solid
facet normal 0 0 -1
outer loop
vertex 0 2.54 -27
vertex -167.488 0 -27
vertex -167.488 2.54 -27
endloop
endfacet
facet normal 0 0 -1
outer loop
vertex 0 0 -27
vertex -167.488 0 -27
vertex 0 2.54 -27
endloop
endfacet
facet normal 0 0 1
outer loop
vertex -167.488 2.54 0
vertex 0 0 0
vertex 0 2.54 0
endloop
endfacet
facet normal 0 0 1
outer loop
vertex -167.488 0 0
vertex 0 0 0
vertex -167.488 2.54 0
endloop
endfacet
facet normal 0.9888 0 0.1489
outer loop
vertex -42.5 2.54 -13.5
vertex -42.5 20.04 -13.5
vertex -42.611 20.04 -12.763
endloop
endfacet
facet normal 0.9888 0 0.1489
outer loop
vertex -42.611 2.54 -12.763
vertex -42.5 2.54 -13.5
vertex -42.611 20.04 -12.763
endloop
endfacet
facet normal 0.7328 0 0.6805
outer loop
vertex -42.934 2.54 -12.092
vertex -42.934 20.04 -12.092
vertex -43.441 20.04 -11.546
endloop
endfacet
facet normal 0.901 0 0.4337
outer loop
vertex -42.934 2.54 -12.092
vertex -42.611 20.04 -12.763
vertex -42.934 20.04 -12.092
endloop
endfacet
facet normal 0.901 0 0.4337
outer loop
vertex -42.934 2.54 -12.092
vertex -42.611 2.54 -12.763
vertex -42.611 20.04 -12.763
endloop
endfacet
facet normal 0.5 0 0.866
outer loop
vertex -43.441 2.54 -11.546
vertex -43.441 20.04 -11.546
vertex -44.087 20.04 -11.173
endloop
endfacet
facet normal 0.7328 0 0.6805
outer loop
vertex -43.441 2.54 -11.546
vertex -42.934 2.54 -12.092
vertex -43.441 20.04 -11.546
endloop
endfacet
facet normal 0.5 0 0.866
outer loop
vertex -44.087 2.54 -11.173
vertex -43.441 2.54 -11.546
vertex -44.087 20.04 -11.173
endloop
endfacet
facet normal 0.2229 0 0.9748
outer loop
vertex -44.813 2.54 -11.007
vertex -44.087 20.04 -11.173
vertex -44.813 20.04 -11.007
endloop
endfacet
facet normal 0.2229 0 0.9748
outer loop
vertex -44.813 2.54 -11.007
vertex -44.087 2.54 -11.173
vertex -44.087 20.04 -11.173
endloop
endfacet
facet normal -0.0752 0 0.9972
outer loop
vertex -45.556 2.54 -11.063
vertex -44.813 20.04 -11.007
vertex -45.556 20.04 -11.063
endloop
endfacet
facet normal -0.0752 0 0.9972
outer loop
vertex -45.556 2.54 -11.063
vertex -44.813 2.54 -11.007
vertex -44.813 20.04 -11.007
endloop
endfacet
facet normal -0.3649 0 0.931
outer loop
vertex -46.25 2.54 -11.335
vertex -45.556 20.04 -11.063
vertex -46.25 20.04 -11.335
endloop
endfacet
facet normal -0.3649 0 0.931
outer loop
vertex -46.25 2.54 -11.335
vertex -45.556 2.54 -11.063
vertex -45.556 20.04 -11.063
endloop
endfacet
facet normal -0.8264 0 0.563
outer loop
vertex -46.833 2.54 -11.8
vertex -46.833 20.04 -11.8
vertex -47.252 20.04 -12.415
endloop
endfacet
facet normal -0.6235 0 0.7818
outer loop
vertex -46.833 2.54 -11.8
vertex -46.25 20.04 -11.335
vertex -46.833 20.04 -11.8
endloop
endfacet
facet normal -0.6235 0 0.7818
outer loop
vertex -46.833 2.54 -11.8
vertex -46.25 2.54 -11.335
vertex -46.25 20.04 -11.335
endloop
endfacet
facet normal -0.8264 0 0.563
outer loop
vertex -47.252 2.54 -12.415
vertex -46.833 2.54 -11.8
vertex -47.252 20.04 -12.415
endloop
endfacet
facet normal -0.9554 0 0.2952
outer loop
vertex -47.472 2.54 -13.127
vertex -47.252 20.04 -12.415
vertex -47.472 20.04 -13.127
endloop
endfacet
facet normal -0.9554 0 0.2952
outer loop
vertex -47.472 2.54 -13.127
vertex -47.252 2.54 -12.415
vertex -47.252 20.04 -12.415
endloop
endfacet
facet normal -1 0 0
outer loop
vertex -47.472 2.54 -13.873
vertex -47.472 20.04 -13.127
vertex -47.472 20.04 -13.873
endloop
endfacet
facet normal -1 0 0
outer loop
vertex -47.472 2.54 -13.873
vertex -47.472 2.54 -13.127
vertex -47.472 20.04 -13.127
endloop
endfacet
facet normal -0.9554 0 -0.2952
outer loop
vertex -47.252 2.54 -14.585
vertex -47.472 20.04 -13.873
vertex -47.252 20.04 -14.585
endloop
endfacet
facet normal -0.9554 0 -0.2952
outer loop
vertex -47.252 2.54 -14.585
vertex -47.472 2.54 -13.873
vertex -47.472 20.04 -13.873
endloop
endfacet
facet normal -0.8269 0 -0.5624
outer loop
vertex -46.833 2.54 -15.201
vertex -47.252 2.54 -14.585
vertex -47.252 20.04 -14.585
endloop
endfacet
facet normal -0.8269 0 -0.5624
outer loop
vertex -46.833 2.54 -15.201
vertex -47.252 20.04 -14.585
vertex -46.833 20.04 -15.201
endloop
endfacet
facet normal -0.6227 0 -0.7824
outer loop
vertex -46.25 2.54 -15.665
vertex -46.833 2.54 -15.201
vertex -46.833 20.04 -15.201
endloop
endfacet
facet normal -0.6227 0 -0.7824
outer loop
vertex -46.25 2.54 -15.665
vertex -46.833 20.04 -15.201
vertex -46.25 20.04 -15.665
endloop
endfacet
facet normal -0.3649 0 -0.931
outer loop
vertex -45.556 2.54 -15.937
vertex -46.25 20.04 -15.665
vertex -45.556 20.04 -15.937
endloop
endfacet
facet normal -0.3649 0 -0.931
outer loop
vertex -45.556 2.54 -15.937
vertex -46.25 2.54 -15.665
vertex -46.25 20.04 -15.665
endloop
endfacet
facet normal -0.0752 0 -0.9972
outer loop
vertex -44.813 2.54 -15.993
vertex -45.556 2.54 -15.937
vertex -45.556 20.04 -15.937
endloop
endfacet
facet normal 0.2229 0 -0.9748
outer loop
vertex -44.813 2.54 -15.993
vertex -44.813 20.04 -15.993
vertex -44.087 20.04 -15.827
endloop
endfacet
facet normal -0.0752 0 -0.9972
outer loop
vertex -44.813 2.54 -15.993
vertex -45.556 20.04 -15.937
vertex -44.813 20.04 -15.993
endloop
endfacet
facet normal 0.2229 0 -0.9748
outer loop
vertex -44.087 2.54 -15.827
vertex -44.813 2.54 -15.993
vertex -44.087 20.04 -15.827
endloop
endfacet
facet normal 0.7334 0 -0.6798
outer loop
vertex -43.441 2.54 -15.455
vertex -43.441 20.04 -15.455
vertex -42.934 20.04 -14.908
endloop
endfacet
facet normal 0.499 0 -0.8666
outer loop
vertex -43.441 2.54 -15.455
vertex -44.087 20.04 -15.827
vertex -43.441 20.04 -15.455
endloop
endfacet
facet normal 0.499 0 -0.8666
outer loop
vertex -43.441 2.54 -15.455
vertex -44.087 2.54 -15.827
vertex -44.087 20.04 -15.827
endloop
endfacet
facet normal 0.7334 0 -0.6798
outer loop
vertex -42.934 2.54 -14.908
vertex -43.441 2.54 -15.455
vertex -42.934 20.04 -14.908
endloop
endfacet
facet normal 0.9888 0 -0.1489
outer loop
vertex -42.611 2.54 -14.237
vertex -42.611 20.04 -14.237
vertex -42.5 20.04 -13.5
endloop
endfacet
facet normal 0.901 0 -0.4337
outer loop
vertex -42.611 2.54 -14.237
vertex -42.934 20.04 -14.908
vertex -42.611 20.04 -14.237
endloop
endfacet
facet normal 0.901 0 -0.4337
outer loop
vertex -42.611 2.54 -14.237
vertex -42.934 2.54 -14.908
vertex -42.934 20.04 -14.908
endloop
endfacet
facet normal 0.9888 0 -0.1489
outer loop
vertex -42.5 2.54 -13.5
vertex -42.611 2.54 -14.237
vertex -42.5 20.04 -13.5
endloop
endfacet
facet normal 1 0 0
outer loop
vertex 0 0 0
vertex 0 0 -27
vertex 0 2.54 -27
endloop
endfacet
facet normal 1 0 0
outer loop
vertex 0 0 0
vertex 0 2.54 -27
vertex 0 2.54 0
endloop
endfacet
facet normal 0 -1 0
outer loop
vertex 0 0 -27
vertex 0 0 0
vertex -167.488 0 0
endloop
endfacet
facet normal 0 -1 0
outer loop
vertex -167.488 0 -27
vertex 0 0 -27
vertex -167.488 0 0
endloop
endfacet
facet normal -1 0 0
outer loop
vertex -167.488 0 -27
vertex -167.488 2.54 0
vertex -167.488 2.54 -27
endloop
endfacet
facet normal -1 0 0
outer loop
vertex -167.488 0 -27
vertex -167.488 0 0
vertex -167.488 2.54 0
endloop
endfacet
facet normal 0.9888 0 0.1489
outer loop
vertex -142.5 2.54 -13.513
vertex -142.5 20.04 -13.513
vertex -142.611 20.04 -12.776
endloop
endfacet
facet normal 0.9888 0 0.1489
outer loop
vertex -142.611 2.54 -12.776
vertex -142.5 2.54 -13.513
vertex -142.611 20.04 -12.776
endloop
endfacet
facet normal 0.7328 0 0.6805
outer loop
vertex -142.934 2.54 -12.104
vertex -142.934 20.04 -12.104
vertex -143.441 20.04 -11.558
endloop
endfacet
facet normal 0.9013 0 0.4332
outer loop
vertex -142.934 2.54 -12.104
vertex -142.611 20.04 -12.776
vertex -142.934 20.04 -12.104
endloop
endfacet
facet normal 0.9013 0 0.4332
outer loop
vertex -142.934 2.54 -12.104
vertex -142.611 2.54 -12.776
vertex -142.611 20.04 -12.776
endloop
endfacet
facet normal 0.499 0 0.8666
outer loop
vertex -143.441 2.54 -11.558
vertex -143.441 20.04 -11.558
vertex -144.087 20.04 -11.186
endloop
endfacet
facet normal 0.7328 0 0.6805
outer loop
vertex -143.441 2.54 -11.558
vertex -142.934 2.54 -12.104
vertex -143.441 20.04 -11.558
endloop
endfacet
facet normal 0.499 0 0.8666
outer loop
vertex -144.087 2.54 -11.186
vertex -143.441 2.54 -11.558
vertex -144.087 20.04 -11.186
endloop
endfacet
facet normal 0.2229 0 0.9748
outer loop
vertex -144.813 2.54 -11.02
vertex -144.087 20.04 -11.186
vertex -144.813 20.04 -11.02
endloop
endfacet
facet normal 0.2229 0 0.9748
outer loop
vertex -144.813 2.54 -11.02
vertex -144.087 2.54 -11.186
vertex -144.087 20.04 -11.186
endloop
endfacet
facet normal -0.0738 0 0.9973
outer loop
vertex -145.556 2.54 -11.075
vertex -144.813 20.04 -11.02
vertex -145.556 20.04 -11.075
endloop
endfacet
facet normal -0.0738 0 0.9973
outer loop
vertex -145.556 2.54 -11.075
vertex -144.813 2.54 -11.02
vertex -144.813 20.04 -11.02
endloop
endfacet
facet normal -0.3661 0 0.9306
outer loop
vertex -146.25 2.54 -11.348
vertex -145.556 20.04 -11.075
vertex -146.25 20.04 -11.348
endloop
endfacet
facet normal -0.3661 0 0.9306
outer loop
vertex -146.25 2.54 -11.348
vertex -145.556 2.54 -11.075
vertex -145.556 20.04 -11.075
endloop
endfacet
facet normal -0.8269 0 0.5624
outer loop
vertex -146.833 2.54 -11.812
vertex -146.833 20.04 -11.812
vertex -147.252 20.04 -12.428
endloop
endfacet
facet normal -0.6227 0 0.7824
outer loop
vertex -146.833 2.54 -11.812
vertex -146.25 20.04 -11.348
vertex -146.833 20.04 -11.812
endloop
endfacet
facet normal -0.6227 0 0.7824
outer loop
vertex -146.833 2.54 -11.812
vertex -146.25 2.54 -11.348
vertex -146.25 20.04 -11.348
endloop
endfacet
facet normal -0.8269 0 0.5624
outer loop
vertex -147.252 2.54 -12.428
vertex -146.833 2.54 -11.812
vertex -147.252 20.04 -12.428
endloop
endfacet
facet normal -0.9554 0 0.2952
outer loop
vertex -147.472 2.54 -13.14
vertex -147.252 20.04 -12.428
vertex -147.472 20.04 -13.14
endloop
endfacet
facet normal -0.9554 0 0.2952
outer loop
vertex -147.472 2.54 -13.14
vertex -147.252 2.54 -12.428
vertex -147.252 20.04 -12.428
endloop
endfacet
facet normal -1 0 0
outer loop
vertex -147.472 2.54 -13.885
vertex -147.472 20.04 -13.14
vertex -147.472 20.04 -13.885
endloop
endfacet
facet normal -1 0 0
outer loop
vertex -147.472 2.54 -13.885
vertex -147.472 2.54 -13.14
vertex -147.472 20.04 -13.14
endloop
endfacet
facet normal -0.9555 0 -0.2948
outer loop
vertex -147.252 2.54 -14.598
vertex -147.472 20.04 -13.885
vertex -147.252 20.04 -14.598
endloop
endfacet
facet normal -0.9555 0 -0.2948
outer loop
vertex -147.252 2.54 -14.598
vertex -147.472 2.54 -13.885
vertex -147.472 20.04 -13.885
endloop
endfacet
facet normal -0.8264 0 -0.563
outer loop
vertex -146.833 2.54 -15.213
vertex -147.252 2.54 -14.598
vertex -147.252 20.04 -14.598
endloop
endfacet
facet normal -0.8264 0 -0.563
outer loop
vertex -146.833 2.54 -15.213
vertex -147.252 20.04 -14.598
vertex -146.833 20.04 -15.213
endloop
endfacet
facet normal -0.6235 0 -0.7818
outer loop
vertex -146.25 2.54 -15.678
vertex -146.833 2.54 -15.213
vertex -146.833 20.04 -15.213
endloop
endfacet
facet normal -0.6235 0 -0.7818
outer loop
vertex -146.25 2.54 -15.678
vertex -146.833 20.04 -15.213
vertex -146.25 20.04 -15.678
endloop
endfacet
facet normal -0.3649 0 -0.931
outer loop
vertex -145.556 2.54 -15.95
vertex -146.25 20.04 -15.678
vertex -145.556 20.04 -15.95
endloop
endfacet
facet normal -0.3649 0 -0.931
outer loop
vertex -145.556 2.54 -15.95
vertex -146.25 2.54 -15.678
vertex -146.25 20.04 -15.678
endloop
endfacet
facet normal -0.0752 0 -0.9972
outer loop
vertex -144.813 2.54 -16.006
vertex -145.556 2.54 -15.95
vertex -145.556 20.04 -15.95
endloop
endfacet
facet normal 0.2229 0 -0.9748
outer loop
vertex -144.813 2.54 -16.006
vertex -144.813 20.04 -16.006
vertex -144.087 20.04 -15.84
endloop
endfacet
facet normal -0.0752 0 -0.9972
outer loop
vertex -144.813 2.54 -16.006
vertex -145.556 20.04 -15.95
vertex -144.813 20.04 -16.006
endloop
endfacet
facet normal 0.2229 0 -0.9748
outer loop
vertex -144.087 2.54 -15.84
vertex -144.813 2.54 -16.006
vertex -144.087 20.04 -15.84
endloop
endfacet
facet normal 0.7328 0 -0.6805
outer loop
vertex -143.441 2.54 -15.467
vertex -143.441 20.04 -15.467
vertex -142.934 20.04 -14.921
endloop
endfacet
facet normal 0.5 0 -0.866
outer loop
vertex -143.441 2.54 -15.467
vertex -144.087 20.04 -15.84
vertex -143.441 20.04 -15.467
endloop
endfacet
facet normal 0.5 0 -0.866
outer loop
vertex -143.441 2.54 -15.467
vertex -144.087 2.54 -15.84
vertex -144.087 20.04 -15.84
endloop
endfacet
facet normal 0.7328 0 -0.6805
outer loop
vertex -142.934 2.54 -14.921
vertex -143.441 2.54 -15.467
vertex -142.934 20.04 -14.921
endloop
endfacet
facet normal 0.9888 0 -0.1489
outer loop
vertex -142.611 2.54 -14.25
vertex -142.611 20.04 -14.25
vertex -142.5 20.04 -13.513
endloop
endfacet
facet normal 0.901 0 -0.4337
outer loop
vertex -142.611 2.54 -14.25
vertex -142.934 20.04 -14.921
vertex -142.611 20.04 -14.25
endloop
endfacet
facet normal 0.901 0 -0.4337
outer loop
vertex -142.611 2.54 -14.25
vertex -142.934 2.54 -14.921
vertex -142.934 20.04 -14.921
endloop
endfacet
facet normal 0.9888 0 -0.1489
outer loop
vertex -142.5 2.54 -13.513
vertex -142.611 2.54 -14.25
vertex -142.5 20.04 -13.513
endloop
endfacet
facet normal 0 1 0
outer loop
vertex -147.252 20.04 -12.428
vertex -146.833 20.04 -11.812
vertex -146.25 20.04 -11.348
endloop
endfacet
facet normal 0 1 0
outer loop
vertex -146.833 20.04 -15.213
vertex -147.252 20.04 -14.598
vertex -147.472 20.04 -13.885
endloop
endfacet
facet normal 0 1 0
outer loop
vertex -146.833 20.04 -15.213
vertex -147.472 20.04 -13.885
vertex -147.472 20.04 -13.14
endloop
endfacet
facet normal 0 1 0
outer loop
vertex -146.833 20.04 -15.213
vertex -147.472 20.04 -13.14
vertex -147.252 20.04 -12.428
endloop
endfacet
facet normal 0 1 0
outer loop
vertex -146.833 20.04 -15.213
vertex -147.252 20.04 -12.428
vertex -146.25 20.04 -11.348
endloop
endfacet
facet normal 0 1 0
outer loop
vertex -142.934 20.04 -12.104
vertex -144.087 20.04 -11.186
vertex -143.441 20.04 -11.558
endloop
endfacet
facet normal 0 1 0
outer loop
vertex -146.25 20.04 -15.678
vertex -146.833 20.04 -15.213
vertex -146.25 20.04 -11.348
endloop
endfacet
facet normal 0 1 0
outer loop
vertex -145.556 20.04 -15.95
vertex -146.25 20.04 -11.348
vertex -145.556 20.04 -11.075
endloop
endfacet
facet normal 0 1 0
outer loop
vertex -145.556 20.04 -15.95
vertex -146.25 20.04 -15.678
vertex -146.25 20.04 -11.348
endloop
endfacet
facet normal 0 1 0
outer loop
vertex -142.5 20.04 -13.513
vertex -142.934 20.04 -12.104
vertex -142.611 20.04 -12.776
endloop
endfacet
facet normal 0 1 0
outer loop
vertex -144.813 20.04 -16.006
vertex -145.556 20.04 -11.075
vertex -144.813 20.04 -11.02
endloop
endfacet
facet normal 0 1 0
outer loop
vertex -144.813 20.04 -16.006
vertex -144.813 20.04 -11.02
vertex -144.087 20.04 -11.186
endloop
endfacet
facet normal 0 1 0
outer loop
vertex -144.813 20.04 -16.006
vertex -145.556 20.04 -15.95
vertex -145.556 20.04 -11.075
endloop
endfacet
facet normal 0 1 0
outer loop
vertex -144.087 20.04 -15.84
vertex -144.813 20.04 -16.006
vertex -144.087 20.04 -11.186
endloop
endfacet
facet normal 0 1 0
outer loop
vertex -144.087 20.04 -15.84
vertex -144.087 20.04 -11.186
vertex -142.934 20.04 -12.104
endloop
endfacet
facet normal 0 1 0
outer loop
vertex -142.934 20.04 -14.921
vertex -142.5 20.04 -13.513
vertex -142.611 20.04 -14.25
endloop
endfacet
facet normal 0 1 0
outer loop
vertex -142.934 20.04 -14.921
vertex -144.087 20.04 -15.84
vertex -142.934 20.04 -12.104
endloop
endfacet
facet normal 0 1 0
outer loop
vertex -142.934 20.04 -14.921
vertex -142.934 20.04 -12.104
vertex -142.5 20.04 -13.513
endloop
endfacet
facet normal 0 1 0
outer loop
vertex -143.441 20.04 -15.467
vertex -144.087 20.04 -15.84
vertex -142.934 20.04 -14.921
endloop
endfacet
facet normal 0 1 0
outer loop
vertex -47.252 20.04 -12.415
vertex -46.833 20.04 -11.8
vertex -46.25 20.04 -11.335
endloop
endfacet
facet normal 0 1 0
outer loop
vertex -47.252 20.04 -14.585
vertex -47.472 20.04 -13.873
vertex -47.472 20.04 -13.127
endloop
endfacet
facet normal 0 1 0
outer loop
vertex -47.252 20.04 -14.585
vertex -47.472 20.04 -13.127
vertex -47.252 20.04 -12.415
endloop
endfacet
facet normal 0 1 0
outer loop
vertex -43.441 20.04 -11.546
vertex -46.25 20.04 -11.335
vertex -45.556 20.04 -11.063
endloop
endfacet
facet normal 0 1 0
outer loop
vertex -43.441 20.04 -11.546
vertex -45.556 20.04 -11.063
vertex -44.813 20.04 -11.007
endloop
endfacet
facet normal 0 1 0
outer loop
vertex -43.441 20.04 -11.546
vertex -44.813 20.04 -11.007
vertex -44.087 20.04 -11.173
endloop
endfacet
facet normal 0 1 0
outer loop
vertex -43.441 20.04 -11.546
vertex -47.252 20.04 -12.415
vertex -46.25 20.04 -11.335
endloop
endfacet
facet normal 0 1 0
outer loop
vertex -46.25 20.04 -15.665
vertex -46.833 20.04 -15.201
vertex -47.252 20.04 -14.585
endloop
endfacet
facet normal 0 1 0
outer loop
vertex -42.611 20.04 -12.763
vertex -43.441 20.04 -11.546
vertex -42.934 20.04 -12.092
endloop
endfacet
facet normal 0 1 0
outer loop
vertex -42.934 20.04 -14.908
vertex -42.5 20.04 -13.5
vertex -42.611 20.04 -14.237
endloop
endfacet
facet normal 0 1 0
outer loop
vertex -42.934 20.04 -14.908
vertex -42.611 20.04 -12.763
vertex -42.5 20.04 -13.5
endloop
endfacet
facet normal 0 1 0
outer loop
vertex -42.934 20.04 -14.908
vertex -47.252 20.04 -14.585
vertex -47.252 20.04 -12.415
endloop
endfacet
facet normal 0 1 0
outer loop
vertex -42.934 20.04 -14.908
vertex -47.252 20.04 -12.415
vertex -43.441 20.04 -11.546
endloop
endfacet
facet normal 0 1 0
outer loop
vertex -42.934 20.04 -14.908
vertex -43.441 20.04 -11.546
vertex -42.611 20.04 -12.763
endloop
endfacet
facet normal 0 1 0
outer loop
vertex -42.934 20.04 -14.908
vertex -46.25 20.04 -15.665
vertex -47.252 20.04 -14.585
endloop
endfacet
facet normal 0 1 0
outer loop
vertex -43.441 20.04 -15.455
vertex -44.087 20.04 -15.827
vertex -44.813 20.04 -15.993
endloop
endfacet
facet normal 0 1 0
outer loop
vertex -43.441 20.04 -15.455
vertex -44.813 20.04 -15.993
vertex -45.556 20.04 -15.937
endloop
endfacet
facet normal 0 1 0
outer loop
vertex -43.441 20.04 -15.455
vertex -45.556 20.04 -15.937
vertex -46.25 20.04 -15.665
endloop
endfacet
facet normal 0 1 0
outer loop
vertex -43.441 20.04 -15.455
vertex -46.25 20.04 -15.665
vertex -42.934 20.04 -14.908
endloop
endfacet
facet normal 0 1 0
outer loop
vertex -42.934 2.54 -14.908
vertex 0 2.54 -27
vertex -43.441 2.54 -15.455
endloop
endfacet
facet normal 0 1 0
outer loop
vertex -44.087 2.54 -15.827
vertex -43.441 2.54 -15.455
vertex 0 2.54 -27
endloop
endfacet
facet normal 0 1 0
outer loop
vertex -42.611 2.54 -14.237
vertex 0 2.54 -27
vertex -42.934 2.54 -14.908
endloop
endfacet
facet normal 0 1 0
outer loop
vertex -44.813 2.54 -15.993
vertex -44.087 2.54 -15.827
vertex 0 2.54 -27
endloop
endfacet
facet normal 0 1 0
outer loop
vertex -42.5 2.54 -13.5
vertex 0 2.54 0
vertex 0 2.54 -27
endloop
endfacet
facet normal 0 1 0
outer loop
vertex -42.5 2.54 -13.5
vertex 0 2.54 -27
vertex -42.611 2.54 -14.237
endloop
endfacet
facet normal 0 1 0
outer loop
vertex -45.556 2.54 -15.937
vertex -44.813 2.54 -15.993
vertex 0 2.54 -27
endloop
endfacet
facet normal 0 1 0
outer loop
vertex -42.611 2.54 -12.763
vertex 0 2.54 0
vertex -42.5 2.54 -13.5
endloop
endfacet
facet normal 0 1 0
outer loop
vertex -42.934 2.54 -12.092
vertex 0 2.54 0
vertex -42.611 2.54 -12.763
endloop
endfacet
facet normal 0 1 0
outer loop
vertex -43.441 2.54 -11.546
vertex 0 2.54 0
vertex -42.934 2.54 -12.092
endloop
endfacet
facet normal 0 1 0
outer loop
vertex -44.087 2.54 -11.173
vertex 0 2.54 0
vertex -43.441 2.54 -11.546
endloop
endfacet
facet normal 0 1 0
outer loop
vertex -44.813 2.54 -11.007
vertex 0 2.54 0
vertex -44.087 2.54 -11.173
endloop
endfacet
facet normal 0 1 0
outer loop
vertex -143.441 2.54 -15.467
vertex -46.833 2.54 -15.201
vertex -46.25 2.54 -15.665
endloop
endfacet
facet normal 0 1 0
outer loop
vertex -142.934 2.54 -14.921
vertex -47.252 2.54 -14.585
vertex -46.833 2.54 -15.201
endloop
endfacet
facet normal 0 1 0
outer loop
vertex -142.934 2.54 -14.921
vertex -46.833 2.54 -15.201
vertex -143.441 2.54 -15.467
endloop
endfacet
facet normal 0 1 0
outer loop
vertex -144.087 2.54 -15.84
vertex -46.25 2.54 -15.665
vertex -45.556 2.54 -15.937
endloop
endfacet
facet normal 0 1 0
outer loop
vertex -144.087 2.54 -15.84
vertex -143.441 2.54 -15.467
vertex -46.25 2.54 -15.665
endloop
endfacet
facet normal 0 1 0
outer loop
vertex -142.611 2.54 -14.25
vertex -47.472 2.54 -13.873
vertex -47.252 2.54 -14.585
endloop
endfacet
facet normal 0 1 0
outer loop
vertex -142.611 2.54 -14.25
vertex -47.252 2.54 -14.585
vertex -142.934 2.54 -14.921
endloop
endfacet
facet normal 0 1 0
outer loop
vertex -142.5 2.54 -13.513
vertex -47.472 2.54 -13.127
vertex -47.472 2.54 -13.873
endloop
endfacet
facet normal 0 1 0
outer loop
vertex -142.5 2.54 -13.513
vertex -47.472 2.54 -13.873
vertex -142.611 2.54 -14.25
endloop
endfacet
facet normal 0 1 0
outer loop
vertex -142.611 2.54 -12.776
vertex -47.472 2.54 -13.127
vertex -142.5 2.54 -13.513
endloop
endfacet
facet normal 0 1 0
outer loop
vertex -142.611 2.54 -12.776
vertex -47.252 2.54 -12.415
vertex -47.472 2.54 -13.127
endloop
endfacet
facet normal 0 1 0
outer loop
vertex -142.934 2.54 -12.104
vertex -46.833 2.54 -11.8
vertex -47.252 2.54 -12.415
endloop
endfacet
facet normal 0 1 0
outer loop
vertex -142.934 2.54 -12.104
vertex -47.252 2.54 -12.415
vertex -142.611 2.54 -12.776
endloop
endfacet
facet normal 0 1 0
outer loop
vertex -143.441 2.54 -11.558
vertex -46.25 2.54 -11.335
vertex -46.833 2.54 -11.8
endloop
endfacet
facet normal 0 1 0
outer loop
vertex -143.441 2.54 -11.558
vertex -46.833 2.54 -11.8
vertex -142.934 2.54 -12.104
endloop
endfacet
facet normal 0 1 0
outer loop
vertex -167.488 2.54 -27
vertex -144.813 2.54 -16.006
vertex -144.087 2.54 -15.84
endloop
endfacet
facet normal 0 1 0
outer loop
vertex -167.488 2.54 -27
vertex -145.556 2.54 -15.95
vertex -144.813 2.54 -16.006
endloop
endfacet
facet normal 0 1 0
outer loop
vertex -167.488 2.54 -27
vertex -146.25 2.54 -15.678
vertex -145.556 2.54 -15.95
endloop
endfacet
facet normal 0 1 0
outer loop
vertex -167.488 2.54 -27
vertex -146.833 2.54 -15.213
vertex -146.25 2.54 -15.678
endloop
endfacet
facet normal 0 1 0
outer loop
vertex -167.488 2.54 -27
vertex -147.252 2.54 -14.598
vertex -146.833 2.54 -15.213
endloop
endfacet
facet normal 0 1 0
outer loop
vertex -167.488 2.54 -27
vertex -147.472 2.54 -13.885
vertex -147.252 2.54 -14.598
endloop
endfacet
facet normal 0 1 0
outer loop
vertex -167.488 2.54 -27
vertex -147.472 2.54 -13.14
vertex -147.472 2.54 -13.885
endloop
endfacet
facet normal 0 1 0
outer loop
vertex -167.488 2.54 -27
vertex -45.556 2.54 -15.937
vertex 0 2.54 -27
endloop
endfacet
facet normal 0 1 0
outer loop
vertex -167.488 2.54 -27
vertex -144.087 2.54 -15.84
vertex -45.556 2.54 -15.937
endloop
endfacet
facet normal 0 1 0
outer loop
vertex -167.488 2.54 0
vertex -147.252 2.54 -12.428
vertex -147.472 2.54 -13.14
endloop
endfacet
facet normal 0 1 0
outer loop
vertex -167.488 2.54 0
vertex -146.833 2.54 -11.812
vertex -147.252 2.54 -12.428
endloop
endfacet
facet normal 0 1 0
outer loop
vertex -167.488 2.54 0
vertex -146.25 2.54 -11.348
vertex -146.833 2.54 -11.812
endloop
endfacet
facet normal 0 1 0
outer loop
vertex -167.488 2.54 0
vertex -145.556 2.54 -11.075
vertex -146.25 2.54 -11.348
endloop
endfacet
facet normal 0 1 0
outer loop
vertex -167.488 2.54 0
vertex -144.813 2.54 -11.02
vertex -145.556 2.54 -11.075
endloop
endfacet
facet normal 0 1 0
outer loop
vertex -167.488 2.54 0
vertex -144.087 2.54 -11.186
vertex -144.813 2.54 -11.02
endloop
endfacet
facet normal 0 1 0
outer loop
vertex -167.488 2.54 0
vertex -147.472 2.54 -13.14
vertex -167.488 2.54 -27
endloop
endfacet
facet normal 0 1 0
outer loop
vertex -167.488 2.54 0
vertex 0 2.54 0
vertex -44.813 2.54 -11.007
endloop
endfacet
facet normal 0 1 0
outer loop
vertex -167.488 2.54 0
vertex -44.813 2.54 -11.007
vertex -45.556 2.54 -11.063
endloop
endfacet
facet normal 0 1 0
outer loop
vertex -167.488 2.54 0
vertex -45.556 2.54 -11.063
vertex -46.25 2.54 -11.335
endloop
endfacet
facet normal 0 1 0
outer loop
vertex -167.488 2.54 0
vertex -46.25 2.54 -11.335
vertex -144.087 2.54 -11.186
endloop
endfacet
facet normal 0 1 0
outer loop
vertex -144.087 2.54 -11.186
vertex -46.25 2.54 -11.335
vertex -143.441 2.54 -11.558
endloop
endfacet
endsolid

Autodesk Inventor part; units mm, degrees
ref_plane "YZ Plane" through (0, 0, 0) normal (1, 0, 0) x (0, 1, 0)
ref_plane "XZ Plane" through (0, 0, 0) normal (0, 1, 0) x (-1, 0, 0)
ref_plane "XY Plane" through (0, 0, 0) normal (0, 0, 1) x (1, 0, 0)
sketch "Sketch1" plane through (0, 0, 0) normal (0, 1, 0) x (-1, 0, 0)
  line L0 (0, 0) -> (167.4876, 0)
  line L1 (167.4876, 0) -> (167.4876, -27)
  line L2 (167.4876, -27) -> (0, -27)
  line L3 (0, -27) -> (0, 0)
  dimension "d0" = 167.4876
  dimension "d1" = 27
extrude "Extrusion1" add sketch "Sketch1" along normal blind 2.54
sketch "Sketch2" plane through (0, 2.54, 0) normal (0, 1, 0) x (1, 0, 0)
  circle A0 centre (-45, 13.5001) radius 2.5
  line L0 (-167.4876, 0) -> (0, 0) projected
  line L1 (0, 0) -> (0, 27) projected
  circle A1 centre (-145, 13.5128) radius 2.5
  dimension "d4" = 5
  dimension "d5" = 13.5001
  dimension "d6" = 45
  dimension "d7" = 5
  dimension "d8" = 13.5128
  dimension "d9" = 100
extrude "Extrusion2" add sketch "Sketch2" along normal blind 17.5
properties part number "DinRail"
